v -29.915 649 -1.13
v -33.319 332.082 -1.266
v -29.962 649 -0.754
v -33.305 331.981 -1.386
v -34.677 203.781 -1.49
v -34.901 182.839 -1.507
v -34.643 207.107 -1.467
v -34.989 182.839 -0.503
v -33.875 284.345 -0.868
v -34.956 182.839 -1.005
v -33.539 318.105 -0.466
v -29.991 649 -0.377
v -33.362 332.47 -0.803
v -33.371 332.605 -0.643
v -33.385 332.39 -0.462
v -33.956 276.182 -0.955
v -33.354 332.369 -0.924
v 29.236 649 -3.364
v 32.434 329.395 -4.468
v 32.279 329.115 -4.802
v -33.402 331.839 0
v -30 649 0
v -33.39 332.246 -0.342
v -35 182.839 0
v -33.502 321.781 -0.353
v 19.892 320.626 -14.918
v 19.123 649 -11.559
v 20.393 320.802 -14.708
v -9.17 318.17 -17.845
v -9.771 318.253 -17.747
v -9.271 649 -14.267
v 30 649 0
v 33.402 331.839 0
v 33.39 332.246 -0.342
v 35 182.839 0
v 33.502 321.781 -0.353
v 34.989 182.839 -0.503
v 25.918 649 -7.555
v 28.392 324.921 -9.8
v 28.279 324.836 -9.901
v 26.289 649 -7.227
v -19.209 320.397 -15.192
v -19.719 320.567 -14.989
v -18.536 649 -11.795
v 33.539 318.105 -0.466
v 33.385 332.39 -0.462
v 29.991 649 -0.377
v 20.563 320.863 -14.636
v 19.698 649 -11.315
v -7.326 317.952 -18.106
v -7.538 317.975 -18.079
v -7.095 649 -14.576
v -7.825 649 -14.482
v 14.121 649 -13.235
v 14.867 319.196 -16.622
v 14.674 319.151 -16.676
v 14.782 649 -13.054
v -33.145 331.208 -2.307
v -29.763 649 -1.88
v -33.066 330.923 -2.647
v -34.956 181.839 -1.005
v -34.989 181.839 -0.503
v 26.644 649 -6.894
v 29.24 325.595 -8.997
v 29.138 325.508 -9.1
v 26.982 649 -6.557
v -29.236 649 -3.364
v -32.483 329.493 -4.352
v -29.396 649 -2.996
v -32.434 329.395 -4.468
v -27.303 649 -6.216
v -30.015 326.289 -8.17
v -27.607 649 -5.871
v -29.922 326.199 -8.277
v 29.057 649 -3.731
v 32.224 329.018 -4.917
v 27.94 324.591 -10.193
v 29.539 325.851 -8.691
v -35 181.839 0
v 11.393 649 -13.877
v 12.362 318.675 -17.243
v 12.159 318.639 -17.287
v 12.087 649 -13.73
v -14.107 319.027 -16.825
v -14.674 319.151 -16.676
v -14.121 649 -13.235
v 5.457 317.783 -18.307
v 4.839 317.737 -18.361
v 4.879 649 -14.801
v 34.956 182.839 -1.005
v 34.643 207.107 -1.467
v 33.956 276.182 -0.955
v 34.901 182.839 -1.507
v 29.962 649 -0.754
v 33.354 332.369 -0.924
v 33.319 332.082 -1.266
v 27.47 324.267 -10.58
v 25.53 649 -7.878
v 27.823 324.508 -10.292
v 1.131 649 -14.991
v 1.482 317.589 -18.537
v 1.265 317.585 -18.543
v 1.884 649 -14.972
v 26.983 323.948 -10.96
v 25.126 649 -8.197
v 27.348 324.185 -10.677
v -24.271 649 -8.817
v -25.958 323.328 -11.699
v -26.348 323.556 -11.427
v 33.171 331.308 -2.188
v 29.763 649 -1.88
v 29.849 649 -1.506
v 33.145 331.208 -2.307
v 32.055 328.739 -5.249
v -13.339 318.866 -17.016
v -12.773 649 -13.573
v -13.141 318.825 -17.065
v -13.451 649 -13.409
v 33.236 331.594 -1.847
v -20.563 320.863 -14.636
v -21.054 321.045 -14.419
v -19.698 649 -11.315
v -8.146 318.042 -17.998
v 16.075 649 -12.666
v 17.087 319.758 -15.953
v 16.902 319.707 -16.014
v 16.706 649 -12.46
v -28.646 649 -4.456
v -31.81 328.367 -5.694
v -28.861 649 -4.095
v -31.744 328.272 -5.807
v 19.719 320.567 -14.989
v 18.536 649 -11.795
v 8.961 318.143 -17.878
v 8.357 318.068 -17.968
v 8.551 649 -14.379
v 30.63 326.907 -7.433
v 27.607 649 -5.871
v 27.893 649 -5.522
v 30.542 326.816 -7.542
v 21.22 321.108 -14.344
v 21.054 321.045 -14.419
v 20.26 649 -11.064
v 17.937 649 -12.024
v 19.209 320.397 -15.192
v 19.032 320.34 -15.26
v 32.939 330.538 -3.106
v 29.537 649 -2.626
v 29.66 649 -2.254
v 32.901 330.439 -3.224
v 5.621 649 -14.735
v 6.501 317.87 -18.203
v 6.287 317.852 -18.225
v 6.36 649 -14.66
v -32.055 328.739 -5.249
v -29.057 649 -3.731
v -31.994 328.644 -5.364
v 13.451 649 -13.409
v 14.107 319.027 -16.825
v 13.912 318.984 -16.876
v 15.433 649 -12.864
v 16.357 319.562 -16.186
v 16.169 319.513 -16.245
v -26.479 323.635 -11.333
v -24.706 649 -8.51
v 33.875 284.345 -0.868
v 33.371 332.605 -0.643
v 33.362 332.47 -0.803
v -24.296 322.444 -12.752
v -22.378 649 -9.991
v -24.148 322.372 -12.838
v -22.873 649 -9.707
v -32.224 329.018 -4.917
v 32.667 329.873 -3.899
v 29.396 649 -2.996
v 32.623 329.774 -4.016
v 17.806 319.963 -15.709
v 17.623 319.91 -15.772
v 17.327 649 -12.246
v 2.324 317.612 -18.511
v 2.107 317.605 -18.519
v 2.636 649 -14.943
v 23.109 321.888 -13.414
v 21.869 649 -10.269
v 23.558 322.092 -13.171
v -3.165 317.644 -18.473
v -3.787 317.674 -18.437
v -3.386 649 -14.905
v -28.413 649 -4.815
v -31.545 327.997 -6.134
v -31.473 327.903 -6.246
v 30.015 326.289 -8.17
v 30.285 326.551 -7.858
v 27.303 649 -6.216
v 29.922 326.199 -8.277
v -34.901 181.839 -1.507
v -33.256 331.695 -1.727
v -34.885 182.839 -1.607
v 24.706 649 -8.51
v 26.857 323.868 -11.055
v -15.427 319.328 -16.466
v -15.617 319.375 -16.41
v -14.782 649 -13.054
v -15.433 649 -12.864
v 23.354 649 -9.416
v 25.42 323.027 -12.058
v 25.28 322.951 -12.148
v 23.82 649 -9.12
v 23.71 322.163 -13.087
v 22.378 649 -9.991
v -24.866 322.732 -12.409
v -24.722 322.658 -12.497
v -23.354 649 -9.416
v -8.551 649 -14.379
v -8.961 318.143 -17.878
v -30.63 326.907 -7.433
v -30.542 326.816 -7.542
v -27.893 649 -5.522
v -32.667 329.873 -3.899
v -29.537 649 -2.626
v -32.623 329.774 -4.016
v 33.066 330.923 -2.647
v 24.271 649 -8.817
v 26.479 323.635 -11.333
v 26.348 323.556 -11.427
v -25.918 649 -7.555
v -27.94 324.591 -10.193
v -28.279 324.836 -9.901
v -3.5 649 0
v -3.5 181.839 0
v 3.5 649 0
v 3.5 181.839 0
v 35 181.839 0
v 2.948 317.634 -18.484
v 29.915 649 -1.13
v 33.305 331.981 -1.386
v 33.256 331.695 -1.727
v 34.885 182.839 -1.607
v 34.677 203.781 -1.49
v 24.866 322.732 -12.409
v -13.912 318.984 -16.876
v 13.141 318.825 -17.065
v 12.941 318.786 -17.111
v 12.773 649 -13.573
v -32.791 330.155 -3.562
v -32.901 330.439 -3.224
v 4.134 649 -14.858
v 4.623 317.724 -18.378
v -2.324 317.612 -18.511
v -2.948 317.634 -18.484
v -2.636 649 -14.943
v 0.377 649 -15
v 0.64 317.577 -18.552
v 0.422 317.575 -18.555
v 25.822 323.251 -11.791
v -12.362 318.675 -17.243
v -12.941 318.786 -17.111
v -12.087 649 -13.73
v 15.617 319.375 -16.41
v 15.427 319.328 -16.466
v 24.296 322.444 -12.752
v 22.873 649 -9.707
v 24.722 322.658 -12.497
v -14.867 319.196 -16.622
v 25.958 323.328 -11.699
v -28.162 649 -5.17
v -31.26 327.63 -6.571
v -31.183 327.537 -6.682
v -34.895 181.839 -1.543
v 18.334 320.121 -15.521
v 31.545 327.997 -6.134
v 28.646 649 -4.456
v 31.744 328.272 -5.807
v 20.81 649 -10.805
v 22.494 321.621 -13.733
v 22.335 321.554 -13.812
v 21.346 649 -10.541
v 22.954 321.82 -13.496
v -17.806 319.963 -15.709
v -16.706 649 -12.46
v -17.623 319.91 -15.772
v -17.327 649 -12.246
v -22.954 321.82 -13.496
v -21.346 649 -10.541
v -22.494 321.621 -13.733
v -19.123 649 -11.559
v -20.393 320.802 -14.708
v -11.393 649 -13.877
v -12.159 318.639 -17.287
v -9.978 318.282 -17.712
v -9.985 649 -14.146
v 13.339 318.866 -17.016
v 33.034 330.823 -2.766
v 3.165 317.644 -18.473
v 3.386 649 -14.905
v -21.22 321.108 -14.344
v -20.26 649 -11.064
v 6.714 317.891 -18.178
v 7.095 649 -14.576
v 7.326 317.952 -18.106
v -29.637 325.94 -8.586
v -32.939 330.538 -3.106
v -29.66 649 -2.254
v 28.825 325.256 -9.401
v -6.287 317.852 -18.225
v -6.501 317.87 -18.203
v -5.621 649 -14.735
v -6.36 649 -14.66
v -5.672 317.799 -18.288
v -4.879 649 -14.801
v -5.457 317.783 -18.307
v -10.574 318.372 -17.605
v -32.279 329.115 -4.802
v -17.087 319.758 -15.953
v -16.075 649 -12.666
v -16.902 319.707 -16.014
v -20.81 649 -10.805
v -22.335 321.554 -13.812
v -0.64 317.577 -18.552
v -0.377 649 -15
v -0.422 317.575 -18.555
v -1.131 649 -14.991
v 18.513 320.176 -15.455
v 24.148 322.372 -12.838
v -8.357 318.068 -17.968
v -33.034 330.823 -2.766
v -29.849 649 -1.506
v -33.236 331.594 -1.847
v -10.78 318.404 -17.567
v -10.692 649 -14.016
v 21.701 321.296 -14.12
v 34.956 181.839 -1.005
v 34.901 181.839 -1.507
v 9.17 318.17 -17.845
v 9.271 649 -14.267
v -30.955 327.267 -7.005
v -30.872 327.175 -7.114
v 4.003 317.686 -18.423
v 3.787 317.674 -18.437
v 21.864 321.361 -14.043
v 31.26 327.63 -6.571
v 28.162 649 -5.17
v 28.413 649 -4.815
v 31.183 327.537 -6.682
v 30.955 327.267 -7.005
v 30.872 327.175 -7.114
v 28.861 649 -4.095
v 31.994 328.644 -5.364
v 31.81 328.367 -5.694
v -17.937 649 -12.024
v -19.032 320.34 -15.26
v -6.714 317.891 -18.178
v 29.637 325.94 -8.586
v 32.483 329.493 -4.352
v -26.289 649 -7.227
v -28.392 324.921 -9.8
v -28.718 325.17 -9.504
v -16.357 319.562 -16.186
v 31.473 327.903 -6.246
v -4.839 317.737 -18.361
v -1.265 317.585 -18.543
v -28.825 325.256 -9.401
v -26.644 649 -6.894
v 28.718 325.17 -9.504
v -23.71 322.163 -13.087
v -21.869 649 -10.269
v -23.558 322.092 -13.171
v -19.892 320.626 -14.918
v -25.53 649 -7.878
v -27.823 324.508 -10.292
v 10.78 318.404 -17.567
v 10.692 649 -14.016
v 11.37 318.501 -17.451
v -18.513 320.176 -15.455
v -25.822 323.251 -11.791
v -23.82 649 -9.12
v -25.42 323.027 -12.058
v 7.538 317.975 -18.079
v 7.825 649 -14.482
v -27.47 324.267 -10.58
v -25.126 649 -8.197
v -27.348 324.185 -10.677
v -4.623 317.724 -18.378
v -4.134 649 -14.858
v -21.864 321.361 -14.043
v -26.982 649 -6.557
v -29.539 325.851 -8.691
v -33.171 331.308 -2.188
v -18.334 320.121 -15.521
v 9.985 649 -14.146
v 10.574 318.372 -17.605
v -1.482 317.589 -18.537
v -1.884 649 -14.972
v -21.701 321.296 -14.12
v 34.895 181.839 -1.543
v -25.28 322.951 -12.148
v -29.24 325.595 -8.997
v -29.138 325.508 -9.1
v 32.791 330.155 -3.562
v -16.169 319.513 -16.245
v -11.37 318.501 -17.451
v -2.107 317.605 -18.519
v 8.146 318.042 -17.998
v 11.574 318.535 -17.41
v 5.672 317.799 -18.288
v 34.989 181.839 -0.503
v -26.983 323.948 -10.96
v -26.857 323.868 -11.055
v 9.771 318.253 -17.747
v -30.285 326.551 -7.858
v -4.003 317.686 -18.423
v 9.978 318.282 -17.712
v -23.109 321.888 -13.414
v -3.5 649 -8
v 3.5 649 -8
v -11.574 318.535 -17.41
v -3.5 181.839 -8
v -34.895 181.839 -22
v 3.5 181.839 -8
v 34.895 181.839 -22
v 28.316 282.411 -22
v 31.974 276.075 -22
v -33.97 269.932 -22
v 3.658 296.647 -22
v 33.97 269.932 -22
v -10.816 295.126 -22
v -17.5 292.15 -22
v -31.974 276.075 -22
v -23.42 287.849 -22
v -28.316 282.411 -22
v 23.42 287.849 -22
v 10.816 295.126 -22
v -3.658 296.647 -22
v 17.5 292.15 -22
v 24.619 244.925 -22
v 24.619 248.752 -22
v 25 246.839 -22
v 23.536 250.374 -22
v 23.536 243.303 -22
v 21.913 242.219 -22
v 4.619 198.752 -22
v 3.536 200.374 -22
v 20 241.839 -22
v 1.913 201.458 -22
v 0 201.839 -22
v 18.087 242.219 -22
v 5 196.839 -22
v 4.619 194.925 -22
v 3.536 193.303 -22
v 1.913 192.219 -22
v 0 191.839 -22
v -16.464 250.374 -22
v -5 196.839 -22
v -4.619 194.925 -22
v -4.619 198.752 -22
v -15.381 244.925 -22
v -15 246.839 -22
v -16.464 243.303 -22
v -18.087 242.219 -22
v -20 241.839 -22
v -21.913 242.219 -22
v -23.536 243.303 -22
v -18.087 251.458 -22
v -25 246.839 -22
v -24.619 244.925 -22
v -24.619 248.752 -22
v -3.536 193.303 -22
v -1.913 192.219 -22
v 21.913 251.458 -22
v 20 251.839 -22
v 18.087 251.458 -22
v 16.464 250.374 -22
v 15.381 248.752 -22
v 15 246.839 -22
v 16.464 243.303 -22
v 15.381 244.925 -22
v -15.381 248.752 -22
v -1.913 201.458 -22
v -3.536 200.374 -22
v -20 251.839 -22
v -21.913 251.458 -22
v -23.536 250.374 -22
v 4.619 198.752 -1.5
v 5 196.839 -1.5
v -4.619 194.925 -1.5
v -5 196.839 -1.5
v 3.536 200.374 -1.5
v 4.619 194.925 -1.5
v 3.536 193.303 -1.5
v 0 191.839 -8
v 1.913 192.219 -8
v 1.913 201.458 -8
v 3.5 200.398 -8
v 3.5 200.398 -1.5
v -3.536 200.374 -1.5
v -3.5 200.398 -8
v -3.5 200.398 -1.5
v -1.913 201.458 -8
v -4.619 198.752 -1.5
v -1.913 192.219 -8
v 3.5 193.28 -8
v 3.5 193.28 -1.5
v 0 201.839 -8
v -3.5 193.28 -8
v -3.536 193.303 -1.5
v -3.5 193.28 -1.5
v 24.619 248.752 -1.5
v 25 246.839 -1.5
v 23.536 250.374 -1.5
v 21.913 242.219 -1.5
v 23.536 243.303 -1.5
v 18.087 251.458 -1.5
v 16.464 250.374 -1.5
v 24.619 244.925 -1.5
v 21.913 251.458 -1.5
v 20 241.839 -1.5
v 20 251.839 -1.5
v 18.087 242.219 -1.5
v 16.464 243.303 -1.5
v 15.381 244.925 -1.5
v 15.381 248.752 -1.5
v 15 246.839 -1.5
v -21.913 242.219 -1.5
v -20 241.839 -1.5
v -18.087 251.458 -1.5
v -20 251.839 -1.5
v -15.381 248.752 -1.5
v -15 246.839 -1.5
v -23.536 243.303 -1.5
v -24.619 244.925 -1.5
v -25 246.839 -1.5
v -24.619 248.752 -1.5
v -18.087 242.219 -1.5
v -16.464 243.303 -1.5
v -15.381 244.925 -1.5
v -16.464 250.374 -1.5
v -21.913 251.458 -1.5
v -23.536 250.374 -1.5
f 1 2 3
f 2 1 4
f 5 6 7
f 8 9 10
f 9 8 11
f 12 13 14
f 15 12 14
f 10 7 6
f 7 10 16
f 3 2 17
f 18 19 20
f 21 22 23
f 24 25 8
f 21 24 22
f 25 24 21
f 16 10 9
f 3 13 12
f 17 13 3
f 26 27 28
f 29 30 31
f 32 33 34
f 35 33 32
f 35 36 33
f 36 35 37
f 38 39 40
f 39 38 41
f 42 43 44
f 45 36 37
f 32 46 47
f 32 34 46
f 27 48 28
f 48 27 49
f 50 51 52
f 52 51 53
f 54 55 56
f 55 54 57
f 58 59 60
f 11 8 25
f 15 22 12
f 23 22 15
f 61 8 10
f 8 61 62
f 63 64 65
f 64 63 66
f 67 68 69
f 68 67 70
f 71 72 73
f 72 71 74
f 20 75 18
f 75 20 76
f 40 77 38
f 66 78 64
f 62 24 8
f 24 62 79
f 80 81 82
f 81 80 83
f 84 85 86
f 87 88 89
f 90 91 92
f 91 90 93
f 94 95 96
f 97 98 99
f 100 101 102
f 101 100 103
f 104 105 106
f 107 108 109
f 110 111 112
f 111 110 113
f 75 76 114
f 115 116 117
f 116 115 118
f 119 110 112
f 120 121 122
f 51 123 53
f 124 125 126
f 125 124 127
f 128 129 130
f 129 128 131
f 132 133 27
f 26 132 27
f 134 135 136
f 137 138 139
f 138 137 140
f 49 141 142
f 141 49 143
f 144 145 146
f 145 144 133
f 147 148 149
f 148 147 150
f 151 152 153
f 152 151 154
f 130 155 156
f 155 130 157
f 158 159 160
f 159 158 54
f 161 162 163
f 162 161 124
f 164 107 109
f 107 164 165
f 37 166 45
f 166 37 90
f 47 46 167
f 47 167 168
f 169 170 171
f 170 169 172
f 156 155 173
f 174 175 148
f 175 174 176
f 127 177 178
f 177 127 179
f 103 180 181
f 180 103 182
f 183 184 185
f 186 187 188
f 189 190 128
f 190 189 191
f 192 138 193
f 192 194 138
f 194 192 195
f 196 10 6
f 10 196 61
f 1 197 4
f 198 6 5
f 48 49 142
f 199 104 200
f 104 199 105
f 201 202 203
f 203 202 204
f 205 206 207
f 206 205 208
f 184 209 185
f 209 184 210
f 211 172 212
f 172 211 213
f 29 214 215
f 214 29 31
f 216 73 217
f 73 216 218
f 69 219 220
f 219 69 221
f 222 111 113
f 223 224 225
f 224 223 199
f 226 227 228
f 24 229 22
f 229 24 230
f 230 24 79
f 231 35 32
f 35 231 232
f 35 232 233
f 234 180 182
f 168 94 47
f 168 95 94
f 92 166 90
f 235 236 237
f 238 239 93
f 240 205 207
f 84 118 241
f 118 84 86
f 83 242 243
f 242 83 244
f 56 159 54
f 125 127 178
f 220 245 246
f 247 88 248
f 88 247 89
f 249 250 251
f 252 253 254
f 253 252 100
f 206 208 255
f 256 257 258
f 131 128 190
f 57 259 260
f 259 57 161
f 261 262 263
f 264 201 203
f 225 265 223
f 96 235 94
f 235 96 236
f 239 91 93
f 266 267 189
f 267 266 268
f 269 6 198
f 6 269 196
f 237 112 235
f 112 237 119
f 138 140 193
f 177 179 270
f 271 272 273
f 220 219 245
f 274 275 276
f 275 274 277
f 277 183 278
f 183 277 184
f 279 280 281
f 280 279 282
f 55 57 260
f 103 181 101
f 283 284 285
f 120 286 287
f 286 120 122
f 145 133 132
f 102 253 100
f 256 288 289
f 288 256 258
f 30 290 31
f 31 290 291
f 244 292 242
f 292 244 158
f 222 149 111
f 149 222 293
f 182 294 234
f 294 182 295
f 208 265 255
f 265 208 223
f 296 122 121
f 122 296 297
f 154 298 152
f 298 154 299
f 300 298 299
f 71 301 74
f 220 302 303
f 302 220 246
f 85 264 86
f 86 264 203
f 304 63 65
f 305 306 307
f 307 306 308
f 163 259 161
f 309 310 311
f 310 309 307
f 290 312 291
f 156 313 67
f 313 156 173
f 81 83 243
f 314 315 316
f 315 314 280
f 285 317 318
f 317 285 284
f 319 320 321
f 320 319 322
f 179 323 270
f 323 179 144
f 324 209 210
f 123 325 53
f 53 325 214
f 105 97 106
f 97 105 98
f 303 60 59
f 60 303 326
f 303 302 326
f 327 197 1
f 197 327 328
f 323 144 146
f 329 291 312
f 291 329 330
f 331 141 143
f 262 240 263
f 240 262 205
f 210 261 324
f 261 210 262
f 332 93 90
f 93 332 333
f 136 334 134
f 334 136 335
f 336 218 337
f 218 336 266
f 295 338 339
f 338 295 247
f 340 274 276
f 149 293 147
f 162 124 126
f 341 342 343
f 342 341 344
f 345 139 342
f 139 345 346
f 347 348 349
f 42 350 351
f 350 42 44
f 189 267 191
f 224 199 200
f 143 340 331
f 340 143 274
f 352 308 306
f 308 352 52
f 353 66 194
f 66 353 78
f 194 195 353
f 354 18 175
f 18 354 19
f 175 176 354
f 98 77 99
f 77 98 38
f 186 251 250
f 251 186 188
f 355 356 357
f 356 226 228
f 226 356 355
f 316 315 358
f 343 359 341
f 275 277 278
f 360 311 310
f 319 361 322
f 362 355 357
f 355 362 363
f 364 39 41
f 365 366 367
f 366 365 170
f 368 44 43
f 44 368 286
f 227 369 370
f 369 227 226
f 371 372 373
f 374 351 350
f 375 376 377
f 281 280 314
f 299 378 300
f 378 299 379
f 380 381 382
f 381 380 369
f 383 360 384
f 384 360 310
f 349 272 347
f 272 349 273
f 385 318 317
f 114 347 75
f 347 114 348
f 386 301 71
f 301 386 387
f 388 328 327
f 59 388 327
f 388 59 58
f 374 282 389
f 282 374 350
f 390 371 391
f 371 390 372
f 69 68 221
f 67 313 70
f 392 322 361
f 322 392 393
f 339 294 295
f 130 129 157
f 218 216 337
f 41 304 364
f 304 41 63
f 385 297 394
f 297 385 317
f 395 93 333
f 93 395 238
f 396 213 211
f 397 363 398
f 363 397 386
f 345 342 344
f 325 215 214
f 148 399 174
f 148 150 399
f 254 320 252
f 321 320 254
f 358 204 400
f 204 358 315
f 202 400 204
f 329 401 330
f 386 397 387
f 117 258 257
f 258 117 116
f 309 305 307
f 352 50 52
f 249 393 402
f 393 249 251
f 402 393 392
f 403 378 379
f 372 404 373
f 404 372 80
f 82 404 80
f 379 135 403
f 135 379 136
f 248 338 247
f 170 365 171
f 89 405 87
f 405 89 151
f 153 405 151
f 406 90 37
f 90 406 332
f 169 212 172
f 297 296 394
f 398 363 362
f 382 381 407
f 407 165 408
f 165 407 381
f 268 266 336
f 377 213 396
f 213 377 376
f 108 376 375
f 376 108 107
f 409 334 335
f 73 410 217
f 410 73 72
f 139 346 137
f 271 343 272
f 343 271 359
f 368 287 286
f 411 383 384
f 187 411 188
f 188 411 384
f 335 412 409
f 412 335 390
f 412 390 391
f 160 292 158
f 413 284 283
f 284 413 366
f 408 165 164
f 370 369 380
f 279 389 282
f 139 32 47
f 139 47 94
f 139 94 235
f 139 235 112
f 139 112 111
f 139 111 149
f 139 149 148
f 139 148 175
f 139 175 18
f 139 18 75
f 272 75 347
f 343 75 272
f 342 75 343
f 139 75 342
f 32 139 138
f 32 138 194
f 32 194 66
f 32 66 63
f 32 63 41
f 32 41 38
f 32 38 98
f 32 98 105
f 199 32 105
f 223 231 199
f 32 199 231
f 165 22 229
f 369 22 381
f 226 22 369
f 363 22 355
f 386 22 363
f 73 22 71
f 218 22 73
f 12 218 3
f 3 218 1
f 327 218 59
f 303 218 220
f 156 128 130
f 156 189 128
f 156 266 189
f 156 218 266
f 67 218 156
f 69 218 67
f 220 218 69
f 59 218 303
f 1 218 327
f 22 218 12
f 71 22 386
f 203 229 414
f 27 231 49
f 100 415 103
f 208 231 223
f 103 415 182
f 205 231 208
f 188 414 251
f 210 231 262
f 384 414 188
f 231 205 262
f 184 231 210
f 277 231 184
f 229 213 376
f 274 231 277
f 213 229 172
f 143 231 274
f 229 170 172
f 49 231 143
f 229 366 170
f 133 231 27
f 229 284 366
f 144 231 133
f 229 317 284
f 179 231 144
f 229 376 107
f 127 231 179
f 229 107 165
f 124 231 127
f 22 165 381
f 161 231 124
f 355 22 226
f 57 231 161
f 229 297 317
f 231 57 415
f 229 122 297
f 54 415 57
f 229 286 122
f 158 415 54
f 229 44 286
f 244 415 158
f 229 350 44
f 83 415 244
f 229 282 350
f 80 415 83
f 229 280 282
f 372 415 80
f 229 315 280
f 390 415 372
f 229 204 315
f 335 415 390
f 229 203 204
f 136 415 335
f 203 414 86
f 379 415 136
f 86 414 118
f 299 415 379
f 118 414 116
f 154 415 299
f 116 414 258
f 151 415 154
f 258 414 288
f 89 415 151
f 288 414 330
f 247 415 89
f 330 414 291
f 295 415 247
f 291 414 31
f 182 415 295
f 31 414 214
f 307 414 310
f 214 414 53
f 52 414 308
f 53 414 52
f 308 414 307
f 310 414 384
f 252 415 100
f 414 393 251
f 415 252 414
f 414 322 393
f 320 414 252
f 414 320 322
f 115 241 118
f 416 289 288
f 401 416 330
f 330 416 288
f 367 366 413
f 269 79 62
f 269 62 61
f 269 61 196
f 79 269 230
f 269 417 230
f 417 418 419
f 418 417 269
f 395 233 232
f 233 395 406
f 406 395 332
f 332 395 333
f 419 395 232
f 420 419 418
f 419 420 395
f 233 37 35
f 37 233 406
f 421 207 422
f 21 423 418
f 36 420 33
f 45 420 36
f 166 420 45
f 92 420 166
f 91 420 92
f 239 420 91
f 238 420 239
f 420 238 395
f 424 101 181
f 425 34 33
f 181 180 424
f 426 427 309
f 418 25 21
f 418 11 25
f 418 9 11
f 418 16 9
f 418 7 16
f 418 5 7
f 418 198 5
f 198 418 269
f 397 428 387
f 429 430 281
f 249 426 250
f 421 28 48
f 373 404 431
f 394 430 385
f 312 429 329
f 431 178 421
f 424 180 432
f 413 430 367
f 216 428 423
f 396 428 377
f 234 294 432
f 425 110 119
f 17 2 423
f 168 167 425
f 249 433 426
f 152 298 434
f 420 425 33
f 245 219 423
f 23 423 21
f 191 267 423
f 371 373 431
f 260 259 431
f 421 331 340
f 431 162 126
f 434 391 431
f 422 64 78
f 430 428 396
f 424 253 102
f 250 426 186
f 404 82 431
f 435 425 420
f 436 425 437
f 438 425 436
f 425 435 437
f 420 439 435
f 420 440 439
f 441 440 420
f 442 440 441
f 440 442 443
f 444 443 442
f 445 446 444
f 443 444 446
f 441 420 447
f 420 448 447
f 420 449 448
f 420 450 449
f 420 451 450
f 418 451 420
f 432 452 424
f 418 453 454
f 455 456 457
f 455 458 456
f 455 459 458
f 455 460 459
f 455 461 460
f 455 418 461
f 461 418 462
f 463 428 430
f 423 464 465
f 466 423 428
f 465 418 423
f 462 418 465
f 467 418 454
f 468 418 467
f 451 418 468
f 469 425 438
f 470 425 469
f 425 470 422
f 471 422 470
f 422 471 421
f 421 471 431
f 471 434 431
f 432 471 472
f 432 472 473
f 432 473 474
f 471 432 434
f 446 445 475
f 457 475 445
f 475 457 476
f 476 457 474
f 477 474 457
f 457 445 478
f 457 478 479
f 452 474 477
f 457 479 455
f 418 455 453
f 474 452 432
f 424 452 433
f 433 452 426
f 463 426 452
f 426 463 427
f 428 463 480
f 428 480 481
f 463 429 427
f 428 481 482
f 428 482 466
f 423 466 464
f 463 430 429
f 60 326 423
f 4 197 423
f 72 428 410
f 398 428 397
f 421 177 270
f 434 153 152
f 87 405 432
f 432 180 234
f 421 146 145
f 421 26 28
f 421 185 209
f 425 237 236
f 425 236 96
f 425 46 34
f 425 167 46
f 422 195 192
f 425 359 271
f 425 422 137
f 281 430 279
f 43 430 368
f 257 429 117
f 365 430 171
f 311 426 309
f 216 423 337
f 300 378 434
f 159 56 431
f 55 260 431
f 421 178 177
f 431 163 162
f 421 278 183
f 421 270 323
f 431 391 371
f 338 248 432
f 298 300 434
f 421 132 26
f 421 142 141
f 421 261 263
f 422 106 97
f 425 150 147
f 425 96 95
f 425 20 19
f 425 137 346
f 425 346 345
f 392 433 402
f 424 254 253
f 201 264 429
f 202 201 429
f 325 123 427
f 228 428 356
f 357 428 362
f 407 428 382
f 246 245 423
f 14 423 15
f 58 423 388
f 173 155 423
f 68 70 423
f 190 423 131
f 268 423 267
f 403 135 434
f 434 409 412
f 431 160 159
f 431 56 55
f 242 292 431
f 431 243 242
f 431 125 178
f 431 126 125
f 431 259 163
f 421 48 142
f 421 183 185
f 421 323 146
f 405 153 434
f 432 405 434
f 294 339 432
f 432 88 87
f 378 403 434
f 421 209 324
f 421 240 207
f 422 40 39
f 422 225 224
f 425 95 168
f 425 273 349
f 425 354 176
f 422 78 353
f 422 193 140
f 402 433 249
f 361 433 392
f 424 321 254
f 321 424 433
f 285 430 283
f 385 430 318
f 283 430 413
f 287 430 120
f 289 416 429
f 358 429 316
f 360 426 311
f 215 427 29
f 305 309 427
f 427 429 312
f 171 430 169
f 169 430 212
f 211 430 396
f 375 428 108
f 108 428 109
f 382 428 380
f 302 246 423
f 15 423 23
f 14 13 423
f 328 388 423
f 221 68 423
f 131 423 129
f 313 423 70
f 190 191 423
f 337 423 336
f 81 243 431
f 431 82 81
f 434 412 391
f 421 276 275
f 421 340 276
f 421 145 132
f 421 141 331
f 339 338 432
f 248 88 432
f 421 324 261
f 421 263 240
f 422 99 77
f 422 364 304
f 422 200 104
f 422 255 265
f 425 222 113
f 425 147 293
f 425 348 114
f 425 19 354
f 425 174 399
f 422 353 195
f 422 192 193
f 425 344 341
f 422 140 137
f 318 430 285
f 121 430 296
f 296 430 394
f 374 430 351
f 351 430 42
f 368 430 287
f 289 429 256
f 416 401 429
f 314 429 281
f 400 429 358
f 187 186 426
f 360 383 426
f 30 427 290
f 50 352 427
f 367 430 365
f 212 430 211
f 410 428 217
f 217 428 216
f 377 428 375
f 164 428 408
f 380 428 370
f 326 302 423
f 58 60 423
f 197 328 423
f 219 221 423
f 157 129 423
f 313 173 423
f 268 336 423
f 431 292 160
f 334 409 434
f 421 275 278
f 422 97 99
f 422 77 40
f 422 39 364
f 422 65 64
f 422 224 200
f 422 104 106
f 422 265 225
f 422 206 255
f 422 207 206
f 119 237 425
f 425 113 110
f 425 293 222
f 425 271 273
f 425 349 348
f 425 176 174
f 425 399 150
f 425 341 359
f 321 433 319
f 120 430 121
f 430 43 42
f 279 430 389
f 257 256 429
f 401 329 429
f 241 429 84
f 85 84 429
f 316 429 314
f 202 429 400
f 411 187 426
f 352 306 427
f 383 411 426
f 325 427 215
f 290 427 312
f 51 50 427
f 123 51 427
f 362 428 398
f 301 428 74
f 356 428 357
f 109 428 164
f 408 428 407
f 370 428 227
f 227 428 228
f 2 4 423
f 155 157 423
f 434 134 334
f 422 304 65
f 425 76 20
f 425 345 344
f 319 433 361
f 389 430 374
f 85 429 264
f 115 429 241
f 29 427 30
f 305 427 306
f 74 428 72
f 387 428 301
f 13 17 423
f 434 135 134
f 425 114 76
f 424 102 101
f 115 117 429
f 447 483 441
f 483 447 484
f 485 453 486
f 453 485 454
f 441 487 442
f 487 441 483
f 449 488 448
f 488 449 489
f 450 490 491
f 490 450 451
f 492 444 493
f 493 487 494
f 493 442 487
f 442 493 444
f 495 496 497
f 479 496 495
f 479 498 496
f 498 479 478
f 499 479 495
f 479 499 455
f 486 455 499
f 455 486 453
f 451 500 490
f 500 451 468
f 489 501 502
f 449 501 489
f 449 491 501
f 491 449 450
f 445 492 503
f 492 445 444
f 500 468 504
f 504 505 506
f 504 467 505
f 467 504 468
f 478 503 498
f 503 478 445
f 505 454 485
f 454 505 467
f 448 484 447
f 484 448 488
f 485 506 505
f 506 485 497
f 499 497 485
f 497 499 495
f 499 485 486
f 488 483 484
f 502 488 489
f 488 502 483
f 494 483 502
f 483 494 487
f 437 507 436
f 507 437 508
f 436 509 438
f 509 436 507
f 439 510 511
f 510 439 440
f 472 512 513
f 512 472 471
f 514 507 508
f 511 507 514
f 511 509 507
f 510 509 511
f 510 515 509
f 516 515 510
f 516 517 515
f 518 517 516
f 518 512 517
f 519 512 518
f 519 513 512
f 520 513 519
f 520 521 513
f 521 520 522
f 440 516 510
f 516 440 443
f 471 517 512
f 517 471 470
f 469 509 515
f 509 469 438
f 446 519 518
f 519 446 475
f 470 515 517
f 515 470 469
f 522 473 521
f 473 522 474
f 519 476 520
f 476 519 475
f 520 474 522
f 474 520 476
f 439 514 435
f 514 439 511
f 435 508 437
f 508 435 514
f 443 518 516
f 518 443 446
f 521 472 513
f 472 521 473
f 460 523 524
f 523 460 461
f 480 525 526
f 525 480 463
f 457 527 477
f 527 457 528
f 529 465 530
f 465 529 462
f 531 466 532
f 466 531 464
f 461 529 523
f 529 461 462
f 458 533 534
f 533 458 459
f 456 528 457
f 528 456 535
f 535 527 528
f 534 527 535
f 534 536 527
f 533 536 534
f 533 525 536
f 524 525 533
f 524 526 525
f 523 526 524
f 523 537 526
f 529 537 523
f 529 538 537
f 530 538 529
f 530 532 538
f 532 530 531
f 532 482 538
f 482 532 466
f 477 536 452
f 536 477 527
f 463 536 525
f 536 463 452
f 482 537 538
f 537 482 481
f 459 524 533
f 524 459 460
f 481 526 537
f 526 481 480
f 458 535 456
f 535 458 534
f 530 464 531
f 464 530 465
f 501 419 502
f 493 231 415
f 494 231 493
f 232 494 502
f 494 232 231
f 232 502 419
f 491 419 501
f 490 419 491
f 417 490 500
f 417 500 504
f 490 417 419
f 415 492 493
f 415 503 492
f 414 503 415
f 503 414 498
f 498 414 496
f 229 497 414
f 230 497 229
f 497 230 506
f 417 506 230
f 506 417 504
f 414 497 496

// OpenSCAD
difference () {
  union () {
    union () {
      hull () {
        translate ([0, 648.0, 0]) {
          resize ([60, 1, 15]){
            intersection () {
              translate ([0, 1/2, -5]) {
                cube ([10, 1, 10], center=true);
              }
              rotate (a=90.0, v=[1, 0, 0]) {
                cylinder ($fn=250, h=1, r=5, center=true);
              }
            }
          }
        }
        translate ([0, 181.83885182611846, 0]) {
          resize ([70, 1, 20]){
            intersection () {
              translate ([0, 1/2, -5]) {
                cube ([10, 1, 10], center=true);
              }
              rotate (a=90.0, v=[1, 0, 0]) {
                cylinder ($fn=250, h=1, r=5, center=true);
              }
            }
          }
        }
      }
    }
    hull () {
      intersection () {
        translate ([0, 0, -11]) {
          linear_extrude (height=22, center=true){
            polygon (points=[[-30, 648.0], [30, 648.0], [35, 171.83885182611846], [-35, 171.83885182611846]]);
          }
        }
        union () {
          translate ([0, 221.83885182611846, -11]) {
            cube ([1000, 80, 22], center=true);
          }
          translate ([0, 261.83885182611846, -11]) {
            cylinder (h=22, r=35, center=true);
          }
        }
      }
      intersection () {
        translate ([0, 331.83885182611846, 0]) {
          rotate (a=-40.0, v=[1, 0, 0]) {
            translate ([0, 1/2, -500]) {
              cube ([1000, 1, 1000], center=true);
            }
          }
        }
        union () {
          hull () {
            translate ([0, 648.0, 0]) {
              resize ([60, 1, 15]){
                intersection () {
                  translate ([0, 1/2, -5]) {
                    cube ([10, 1, 10], center=true);
                  }
                  rotate (a=90.0, v=[1, 0, 0]) {
                    cylinder ($fn=250, h=1, r=5, center=true);
                  }
                }
              }
            }
            translate ([0, 181.83885182611846, 0]) {
              resize ([70, 1, 20]){
                intersection () {
                  translate ([0, 1/2, -5]) {
                    cube ([10, 1, 10], center=true);
                  }
                  rotate (a=90.0, v=[1, 0, 0]) {
                    cylinder ($fn=250, h=1, r=5, center=true);
                  }
                }
              }
            }
          }
        }
      }
    }
  }
  translate ([0, 500, 0]) {
    cube ([7, 1000, 16], center=true);
  }
  union () {
    translate ([0, 196.83885182611846, -22]) {
      translate ([0, 0, 10]) {
        cylinder (h=21, r=5, center=true);
      }
    }
    translate ([20, 246.83885182611846, -22]) {
      translate ([0, 0, 10]) {
        cylinder (h=21, r=5, center=true);
      }
    }
    translate ([-20, 246.83885182611846, -22]) {
      translate ([0, 0, 10]) {
        cylinder (h=21, r=5, center=true);
      }
    }
  }
}
